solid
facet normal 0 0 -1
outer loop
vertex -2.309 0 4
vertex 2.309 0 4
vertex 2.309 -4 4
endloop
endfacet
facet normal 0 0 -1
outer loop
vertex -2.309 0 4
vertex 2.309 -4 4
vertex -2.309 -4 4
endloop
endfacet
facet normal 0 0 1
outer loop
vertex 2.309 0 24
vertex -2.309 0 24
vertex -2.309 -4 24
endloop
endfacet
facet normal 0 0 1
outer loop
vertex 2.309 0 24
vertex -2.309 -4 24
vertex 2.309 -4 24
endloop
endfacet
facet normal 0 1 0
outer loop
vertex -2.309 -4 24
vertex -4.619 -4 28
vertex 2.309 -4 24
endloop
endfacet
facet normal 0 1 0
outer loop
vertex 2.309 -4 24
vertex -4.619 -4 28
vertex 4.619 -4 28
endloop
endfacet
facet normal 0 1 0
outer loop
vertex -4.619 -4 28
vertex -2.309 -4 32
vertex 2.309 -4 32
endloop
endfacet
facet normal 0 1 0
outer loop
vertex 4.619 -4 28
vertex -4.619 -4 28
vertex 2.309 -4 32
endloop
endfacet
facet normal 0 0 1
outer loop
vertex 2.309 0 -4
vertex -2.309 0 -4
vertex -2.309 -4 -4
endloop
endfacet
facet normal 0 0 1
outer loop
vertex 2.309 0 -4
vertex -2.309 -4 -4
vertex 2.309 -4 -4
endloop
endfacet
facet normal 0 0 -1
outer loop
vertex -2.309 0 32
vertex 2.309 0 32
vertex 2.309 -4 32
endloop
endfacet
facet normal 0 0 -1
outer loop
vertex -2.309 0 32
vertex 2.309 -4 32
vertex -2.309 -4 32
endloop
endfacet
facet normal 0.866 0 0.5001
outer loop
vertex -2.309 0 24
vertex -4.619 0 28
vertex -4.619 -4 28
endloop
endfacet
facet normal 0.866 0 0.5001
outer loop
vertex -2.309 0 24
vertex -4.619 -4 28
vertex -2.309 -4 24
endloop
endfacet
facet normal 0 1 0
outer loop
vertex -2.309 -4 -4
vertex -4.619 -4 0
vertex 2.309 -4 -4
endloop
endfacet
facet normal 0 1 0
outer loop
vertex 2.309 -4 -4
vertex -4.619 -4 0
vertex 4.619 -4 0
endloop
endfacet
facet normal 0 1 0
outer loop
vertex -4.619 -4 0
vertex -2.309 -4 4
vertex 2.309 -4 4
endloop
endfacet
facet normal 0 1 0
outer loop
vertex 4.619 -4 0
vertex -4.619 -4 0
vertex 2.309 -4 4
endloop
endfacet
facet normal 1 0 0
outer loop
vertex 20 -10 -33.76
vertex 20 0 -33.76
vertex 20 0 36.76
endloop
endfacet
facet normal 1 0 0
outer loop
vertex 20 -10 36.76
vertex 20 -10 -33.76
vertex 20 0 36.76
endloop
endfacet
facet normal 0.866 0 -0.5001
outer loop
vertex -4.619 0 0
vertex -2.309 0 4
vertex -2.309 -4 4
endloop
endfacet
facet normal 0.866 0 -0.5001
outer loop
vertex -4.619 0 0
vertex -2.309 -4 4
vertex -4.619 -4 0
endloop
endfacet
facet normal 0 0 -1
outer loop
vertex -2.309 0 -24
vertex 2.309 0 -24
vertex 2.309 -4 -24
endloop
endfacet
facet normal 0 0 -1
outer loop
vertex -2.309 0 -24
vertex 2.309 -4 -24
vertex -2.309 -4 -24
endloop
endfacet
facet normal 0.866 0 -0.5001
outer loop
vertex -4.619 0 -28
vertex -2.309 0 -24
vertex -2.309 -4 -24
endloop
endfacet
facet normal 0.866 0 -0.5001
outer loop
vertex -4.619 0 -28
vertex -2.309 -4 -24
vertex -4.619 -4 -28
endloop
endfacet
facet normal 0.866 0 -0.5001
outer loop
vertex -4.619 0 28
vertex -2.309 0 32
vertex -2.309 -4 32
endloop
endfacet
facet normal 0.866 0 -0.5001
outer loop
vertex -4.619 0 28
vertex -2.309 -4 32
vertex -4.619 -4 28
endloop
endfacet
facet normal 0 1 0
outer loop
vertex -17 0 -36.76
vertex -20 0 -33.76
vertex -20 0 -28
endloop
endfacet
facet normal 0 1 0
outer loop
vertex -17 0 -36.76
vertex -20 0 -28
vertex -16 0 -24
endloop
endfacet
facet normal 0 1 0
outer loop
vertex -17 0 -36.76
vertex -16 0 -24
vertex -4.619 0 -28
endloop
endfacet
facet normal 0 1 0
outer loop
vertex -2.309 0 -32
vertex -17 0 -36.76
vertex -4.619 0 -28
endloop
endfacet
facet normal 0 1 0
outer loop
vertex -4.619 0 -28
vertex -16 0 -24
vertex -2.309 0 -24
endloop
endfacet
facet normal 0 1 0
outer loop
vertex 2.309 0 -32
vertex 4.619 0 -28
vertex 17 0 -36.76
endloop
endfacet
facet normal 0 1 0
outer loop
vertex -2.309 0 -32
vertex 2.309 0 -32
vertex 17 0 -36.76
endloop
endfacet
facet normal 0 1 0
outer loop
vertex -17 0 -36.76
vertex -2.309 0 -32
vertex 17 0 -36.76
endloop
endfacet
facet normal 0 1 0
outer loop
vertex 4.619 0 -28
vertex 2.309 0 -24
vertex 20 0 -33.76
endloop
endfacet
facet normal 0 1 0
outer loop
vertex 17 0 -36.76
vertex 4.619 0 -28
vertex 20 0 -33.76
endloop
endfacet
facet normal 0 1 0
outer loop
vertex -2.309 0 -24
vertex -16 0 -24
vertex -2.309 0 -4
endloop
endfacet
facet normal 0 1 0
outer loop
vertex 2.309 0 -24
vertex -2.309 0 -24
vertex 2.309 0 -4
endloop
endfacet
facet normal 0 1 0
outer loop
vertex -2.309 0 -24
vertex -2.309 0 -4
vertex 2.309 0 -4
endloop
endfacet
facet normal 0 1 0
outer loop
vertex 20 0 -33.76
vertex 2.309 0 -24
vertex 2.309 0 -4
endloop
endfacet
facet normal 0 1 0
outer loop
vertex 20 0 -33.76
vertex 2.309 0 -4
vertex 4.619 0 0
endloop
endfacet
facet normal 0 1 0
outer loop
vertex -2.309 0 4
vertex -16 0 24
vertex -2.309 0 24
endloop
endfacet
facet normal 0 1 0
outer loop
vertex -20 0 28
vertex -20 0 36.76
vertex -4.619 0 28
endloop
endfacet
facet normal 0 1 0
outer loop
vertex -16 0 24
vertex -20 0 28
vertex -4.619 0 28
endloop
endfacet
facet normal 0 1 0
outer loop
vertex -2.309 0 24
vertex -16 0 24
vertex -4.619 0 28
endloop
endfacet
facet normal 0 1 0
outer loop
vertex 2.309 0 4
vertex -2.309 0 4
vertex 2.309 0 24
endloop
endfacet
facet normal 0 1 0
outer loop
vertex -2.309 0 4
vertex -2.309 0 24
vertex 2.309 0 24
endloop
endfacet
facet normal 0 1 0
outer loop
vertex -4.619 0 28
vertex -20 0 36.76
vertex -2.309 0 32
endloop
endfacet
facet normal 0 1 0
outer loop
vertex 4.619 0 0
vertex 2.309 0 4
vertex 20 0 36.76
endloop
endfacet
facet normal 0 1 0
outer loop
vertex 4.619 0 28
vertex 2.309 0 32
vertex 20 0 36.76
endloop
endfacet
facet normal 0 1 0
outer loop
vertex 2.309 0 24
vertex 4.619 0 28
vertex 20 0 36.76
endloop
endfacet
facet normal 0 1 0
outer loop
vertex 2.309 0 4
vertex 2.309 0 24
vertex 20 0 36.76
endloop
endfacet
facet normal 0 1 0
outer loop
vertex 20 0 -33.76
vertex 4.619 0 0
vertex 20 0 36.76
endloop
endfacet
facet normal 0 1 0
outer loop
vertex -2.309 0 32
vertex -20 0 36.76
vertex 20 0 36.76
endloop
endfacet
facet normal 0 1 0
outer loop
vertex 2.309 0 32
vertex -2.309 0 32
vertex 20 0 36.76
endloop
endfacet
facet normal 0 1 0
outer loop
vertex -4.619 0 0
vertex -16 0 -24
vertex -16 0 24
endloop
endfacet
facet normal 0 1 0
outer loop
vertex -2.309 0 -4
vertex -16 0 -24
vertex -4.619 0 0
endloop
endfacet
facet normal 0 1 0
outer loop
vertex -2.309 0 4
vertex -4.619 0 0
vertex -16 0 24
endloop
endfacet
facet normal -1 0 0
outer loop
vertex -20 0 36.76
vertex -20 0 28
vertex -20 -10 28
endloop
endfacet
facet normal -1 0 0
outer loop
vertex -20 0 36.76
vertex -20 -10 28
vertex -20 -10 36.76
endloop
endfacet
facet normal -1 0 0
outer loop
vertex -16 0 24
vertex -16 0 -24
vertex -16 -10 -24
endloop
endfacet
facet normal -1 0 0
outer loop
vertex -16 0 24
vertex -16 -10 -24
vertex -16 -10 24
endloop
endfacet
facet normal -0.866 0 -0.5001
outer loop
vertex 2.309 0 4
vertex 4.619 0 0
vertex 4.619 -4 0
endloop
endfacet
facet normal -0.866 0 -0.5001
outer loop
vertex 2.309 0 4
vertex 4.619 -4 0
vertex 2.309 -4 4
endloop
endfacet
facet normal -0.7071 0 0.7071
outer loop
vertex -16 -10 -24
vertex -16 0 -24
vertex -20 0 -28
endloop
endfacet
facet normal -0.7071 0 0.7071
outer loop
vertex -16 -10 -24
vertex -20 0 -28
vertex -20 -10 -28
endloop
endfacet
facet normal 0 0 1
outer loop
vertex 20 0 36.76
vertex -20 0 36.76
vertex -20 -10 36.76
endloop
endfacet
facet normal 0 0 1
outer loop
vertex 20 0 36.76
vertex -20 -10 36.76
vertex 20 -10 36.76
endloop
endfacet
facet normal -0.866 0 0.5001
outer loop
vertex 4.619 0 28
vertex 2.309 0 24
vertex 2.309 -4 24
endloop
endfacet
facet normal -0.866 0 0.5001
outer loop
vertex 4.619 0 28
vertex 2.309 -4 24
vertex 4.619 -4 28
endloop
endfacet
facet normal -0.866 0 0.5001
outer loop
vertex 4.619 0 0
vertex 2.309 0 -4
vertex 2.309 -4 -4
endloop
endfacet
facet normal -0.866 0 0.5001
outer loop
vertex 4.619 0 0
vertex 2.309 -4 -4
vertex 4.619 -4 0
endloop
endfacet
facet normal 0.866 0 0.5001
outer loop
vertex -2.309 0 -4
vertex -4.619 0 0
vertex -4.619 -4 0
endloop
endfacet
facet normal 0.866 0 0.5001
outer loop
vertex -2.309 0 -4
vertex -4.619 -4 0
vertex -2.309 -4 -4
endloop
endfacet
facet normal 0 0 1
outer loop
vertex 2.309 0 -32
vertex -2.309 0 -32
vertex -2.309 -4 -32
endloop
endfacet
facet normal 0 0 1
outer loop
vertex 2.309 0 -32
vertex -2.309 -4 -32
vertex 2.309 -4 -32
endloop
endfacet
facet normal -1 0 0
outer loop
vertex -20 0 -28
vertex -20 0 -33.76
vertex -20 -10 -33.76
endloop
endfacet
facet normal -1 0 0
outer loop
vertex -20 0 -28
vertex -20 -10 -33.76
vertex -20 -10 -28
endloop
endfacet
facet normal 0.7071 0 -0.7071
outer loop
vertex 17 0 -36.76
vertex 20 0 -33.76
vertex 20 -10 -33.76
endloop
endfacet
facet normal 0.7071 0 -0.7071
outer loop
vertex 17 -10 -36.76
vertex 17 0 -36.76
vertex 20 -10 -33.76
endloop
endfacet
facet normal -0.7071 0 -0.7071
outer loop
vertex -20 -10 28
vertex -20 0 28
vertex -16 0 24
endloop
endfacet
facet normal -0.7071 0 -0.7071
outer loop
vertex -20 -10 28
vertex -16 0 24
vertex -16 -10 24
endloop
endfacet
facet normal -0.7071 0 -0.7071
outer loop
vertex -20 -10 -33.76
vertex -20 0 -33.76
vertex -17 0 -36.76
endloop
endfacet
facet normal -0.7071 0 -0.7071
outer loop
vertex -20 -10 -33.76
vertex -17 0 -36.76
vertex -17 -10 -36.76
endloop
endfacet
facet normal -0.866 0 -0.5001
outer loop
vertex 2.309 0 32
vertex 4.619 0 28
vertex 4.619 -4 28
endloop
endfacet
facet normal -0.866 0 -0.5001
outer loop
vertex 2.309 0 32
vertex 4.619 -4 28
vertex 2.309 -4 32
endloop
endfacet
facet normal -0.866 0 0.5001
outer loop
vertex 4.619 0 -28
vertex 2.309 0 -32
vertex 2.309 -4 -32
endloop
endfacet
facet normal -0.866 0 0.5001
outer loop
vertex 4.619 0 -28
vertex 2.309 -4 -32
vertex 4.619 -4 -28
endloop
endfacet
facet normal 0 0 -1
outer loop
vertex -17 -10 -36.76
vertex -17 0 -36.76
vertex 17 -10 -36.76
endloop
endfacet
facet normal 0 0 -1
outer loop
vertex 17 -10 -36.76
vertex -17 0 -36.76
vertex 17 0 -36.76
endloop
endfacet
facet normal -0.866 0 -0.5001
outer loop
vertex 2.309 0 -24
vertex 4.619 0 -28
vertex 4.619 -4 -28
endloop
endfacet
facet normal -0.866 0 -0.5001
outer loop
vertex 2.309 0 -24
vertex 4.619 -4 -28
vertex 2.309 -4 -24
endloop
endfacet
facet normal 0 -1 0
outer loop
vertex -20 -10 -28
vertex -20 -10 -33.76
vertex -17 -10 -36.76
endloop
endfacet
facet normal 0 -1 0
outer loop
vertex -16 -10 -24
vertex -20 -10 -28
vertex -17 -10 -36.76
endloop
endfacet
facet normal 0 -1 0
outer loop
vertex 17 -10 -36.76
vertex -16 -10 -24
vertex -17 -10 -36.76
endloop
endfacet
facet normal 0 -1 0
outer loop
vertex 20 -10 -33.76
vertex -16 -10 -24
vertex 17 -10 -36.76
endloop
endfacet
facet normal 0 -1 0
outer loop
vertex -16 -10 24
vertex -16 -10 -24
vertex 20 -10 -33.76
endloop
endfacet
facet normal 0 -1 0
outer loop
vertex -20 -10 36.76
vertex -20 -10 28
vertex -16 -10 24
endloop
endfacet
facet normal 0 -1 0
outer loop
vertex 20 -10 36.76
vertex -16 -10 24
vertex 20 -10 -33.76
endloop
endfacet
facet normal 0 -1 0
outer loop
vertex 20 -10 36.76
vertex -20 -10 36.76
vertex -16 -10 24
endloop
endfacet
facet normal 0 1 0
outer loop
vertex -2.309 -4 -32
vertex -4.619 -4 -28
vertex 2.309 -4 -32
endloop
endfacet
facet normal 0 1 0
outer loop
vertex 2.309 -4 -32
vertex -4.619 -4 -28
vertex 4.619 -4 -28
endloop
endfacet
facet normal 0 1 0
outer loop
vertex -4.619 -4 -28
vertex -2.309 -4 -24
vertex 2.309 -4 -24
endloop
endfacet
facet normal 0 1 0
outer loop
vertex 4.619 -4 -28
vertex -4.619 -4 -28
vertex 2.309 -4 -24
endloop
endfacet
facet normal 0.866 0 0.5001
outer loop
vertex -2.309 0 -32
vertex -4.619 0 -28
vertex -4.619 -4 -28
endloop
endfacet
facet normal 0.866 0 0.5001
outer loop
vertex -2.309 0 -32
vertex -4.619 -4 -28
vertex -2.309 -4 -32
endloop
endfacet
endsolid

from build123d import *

# Parameters (mm, degrees)
F1_W     = 40
F1_H     = 73.52
F2_DEPTH = 10
F3_DEPTH = 4
F4_SIZE  = 3
F5_SIZE  = 3
F6_W     = 4
F6_H     = 48
F7_DEPTH = 25
F8_SIZE  = 3.99999


# Not quite as in the source:
# - a fillet or chamfer is up to 0.001 mm smaller than in the source, because OpenCascade refuses the exact size


with BuildPart() as f2:
    # F1 (on Front) → F2 (new body)
    with BuildSketch(Plane.XZ):
        Rectangle(F1_W, F1_H)
    extrude(amount=F2_DEPTH)

    # F0 (on Front) → F3 (cut)
    with BuildSketch(Plane.XZ):
        Polygon((2.3094010768, 4), (-2.3094010768, 4), (-4.6188021535, 0), (-2.3094010768, -4), (2.3094010768, -4), (4.6188021535, 0), align=None)
        Polygon((2.3094010768, 32), (-2.3094010768, 32), (-4.6188021535, 28), (-2.3094010768, 24), (2.3094010768, 24), (4.6188021535, 28), align=None)
        Polygon((2.3094010768, -24), (-2.3094010768, -24), (-4.6188021535, -28), (-2.3094010768, -32), (2.3094010768, -32), (4.6188021535, -28), align=None)
    extrude(amount=F3_DEPTH, mode=Mode.SUBTRACT)

    # F4
    f4_edges = [f2.edges().sort_by_distance(p)[0] for p in [
        (20, -5, -36.76),
    ]]
    chamfer(f4_edges, length=F4_SIZE)

    # F5
    f5_edges = [f2.edges().sort_by_distance(p)[0] for p in [
        (-20, -5, -36.76),
    ]]
    chamfer(f5_edges, length=F5_SIZE)

    # F6 (on Front) → F7 (cut)
    with BuildSketch(Plane.XZ):
        with Locations((-18, 0)):
            Rectangle(F6_W, F6_H)
    extrude(amount=F7_DEPTH, mode=Mode.SUBTRACT)

    # F8 (size 4 in the source; OpenCascade refuses exactly that, so slightly less here)
    f8_edges = [f2.edges().sort_by_distance(p)[0] for p in [
        (-20, -5, 24),
        (-20, -5, -24),
    ]]
    chamfer(f8_edges, length=F8_SIZE)


solid = f2.part
